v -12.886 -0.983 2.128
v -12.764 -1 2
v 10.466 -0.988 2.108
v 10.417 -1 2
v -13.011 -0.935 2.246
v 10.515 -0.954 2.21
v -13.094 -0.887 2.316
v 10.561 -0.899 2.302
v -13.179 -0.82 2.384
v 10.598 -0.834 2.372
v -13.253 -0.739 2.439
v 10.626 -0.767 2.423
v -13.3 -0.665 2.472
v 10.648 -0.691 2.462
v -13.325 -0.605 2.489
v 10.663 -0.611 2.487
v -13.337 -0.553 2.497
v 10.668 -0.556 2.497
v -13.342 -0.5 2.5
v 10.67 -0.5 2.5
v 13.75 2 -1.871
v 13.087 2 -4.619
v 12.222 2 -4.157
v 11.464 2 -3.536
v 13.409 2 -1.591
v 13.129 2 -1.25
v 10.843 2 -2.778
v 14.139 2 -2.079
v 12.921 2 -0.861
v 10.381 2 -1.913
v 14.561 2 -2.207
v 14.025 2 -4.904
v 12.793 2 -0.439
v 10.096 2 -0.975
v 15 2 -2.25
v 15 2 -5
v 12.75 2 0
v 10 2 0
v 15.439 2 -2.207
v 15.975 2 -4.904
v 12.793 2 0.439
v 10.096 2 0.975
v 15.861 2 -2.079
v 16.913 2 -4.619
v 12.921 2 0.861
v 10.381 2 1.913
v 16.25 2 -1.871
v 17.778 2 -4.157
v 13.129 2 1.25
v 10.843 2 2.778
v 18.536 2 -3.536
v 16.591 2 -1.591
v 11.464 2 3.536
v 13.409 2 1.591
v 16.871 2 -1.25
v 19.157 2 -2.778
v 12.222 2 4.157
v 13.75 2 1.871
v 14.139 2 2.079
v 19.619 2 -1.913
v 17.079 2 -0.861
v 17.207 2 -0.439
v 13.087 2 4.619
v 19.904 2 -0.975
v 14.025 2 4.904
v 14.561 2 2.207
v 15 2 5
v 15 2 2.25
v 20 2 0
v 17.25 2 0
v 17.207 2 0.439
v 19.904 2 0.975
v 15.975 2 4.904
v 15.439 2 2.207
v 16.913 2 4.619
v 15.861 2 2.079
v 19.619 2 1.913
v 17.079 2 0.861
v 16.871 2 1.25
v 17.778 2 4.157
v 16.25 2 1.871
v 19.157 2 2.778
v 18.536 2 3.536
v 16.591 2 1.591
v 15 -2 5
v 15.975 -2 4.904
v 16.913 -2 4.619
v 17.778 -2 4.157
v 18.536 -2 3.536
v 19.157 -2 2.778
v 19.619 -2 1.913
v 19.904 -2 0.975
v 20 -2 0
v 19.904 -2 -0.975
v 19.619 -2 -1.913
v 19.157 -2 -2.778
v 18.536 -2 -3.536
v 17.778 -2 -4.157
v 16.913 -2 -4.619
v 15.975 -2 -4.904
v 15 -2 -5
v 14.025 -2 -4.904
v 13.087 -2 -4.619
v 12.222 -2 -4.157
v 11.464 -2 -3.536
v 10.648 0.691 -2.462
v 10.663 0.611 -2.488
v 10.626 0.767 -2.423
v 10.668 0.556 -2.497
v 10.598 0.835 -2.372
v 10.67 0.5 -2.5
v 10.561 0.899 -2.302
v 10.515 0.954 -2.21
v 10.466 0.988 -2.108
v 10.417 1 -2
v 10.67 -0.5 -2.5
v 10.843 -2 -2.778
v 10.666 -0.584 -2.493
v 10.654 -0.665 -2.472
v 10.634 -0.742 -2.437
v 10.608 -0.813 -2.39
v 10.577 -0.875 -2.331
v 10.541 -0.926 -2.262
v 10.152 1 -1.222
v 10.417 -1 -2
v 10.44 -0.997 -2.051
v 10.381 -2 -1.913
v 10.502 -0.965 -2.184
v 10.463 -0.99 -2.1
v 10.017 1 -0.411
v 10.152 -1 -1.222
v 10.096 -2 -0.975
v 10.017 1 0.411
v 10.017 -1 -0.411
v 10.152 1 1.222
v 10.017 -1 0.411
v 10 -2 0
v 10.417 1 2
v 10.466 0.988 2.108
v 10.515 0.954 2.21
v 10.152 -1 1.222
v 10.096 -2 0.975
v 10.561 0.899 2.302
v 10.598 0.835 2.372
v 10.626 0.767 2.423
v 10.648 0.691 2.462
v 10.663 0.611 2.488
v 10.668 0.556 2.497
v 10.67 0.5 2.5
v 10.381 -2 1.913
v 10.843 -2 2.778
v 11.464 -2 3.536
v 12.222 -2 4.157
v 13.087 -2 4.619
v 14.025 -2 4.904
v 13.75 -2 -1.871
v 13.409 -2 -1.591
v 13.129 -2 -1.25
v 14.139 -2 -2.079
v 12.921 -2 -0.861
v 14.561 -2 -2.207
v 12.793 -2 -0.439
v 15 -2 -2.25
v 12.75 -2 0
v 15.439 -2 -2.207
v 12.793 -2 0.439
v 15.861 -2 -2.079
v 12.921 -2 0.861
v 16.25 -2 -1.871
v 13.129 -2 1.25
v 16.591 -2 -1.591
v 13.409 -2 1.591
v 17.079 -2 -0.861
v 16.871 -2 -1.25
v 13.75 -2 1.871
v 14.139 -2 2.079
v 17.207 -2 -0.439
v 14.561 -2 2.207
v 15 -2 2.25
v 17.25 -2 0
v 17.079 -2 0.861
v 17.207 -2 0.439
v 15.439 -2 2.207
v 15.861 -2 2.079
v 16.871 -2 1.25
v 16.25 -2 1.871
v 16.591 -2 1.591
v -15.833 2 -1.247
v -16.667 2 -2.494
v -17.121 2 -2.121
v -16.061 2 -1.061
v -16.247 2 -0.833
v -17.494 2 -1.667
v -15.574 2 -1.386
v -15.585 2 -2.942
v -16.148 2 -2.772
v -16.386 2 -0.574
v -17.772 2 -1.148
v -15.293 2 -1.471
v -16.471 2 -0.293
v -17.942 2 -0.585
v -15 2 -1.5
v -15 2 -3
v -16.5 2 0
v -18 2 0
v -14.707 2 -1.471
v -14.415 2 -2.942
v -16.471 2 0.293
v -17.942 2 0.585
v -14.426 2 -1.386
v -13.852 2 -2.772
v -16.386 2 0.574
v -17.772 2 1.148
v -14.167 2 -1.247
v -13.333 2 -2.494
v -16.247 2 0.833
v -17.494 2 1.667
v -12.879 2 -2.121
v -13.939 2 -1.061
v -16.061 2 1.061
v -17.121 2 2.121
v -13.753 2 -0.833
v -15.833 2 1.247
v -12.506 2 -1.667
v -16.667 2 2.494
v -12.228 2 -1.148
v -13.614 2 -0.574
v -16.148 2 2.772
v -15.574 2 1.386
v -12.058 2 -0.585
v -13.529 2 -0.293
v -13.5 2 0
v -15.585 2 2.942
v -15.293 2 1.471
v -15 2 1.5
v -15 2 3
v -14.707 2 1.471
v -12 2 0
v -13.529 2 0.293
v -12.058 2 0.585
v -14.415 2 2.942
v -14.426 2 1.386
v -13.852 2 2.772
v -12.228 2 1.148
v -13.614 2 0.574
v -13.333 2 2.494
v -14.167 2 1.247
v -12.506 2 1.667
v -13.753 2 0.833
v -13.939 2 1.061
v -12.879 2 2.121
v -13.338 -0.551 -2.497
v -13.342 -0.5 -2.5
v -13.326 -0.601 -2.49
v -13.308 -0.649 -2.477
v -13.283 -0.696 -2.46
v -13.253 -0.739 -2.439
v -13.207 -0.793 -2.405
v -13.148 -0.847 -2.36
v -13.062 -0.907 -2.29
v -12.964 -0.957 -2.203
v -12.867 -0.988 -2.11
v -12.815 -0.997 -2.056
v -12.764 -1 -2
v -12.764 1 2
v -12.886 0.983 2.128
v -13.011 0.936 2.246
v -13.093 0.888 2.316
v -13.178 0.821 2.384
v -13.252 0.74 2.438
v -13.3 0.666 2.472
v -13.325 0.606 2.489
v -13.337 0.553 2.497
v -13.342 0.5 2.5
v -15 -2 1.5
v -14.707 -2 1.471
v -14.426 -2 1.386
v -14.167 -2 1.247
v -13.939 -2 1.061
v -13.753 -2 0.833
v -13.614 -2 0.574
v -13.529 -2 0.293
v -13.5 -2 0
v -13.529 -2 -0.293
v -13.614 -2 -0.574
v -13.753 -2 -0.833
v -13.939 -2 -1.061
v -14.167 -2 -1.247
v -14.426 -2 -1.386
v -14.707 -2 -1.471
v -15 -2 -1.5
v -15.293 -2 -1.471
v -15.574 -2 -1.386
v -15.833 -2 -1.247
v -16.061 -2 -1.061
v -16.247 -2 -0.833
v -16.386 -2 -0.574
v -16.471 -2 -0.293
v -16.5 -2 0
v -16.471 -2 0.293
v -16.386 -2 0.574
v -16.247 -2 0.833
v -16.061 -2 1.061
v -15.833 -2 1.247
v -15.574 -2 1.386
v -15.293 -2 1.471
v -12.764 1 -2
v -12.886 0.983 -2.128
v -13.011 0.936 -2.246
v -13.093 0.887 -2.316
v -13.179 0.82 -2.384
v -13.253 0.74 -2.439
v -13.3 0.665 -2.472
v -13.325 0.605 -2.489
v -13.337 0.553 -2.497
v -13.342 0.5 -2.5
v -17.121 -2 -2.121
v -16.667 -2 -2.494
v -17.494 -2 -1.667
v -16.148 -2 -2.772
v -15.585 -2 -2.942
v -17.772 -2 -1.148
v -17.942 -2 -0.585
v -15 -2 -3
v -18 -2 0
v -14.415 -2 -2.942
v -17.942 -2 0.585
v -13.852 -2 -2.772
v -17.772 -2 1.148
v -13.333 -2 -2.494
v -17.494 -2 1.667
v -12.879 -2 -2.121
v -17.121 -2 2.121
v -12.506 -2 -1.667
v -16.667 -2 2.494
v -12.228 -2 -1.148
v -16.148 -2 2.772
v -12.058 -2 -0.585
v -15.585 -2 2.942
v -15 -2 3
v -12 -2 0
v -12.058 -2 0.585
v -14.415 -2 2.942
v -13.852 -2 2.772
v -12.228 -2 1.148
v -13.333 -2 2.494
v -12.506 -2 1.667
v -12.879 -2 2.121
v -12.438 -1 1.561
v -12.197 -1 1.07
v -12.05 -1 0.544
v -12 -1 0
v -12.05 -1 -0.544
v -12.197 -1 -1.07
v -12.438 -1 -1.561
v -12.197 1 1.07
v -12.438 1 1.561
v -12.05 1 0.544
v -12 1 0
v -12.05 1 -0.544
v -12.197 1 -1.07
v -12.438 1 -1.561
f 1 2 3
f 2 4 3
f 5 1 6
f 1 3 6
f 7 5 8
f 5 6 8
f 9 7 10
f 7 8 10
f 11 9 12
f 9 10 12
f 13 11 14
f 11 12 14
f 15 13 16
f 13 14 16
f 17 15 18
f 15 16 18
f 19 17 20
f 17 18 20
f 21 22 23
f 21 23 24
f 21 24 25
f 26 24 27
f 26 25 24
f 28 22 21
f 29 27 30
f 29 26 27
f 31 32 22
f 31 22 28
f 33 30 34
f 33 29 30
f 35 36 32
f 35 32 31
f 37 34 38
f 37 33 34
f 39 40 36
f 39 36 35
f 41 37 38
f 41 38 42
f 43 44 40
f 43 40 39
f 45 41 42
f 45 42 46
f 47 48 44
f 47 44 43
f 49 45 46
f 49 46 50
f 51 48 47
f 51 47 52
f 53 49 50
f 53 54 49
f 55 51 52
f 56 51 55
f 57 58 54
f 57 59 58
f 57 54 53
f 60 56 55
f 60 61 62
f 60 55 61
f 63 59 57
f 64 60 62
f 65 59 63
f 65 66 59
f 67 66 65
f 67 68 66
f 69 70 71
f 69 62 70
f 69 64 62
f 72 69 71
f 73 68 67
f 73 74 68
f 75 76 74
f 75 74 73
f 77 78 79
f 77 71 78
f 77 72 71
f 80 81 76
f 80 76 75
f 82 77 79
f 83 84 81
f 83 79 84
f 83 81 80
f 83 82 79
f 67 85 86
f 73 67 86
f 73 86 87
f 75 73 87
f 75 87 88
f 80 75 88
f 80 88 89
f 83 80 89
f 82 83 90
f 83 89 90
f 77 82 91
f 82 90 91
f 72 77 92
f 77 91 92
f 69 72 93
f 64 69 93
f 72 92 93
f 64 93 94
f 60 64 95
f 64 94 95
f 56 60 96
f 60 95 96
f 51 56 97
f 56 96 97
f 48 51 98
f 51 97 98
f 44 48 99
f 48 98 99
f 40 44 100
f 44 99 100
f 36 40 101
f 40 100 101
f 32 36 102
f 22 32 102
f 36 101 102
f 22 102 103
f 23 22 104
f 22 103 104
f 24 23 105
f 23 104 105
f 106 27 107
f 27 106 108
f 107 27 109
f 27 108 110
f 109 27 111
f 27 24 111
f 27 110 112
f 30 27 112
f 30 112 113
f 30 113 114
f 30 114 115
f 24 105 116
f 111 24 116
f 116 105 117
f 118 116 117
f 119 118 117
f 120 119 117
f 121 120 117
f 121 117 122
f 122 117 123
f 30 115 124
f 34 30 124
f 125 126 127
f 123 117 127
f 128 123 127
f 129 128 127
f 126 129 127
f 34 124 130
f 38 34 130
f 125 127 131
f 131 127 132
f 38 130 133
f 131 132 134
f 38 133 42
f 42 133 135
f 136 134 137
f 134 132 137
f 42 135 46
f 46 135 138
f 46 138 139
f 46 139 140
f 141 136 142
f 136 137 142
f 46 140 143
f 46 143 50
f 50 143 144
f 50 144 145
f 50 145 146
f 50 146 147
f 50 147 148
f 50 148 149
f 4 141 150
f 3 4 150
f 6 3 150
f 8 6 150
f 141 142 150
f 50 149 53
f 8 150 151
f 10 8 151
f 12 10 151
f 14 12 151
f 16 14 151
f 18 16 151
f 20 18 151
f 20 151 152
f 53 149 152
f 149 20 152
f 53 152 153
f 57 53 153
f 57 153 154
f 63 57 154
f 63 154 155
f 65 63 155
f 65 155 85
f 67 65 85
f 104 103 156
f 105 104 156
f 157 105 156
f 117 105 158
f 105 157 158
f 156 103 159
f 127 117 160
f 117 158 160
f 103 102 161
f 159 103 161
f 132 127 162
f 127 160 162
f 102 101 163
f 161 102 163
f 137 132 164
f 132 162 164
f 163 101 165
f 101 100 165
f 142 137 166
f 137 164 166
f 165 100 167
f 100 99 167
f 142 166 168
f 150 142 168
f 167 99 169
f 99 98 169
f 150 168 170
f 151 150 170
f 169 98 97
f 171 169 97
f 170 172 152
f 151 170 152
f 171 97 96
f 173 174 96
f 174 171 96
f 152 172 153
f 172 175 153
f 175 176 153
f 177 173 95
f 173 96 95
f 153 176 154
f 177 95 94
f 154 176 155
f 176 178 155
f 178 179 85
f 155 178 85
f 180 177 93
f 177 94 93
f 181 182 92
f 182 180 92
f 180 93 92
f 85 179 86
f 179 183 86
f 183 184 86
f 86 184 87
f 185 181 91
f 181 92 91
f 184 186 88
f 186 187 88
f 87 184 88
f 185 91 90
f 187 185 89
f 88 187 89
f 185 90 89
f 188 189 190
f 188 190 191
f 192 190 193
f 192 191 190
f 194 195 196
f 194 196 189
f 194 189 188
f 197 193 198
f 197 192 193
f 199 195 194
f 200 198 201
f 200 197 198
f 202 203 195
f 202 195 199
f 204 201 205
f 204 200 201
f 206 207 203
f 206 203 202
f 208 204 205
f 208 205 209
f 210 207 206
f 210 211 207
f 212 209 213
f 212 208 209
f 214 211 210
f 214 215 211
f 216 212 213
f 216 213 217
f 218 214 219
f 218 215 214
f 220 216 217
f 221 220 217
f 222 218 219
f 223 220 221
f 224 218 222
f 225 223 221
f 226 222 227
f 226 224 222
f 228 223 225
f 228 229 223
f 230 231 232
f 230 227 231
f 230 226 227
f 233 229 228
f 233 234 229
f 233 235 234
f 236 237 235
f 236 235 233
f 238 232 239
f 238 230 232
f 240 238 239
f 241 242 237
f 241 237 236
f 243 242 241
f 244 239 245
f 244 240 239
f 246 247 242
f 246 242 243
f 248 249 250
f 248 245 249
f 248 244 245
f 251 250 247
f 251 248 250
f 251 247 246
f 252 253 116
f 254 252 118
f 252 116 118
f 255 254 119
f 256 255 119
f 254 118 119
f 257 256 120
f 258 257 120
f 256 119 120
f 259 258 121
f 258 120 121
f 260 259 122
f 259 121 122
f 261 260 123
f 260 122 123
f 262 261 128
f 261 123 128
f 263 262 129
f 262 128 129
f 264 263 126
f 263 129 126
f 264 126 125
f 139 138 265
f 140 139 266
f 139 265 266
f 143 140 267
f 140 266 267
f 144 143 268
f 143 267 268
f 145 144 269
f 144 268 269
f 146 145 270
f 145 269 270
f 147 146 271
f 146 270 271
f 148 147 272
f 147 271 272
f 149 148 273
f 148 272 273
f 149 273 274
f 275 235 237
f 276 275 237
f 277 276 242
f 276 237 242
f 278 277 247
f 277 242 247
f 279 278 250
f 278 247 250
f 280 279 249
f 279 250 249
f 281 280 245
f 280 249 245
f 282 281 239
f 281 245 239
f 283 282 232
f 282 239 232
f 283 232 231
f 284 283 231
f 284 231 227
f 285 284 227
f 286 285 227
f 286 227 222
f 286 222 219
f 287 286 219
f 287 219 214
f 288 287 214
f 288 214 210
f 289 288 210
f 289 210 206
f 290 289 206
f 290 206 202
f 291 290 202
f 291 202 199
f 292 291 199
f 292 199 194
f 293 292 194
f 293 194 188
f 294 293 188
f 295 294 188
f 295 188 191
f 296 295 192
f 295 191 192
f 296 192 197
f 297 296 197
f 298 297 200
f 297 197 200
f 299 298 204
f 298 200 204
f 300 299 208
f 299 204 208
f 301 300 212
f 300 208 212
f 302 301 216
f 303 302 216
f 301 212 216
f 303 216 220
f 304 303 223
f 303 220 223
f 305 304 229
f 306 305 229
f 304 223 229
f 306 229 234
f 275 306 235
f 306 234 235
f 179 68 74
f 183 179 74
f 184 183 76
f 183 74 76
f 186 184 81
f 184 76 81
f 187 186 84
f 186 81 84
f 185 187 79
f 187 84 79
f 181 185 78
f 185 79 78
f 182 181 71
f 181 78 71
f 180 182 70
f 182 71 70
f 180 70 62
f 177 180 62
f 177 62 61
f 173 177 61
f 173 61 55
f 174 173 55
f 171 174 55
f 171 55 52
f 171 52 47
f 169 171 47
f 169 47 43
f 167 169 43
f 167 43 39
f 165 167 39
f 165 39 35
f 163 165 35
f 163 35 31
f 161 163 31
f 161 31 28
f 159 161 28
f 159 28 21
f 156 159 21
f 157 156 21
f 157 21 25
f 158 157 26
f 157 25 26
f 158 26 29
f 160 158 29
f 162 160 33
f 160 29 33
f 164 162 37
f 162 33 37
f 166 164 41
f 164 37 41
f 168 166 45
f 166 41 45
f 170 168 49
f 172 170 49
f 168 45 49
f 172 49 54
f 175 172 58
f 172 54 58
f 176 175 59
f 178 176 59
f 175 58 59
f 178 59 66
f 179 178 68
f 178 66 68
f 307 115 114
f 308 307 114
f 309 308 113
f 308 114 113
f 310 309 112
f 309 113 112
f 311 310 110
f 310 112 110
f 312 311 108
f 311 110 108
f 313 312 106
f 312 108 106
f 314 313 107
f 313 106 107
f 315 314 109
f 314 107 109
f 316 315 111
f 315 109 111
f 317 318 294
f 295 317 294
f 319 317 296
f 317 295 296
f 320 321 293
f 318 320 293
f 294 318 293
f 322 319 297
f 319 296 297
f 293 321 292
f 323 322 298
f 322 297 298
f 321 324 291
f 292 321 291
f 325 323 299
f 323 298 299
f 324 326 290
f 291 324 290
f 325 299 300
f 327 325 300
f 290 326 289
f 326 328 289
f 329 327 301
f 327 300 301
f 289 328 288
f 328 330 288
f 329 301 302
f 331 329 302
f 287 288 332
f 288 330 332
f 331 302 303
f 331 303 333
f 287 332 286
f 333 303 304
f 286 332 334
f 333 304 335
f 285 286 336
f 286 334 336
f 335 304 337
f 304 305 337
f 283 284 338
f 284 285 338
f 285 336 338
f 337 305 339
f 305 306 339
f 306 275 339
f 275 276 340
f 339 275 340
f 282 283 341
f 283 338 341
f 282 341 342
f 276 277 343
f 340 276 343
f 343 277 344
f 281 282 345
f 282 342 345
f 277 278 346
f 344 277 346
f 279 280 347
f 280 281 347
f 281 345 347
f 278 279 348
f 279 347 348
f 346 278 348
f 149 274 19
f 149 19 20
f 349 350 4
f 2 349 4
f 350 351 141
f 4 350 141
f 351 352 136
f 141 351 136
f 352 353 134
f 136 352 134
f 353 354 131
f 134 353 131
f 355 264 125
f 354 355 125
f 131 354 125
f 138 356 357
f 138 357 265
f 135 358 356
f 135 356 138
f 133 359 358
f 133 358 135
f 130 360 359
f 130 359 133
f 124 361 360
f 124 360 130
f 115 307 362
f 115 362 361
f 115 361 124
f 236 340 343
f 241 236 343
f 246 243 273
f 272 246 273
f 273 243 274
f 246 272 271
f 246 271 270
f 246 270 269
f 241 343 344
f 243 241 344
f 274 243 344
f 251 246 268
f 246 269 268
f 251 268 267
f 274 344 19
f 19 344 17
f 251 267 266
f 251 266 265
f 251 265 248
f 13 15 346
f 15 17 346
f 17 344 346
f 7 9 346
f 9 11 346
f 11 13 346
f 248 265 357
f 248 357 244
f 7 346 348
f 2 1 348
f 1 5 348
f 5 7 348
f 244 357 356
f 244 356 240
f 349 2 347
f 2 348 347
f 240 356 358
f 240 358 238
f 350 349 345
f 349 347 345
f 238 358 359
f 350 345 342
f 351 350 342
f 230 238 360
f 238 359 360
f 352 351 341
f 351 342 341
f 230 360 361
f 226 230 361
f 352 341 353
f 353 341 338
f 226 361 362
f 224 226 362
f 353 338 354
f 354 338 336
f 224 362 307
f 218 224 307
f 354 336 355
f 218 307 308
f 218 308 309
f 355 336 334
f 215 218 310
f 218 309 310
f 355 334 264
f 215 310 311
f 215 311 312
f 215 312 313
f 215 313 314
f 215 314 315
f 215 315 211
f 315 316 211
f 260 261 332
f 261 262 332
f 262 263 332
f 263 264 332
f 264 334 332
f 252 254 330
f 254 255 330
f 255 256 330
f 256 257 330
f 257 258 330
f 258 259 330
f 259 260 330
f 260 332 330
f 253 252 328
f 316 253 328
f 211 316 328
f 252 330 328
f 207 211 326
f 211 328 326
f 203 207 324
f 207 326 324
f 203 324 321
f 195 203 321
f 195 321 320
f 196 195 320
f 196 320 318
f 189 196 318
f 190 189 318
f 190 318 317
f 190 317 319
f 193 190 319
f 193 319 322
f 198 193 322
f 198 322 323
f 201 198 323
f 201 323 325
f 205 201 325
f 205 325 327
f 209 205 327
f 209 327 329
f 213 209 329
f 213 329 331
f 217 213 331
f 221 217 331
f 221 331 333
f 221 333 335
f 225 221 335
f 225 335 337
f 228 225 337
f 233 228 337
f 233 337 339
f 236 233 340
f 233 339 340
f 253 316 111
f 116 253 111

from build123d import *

# Parameters (mm, degrees)
SKETCH1_W                = 30
SKETCH1_H                = 5
BOSS_EXTRUDE2_DEPTH      = 1
BOSS_EXTRUDE3_DEPTH      = 1
BOSS_EXTRUDE3_DEPTH_BACK = 3
SKETCH2_R                = 3
SKETCH2_R_2              = 5
SKETCH3_R                = 1.5
SKETCH3_R_2              = 2.25
CUT_EXTRUDE1_DEPTH       = 41
FILLET1_R                = 0.5
FILLET2_R                = 0.5


with BuildPart() as part:
    # Sketch1 → Boss-Extrude2 (new, symmetric)
    with BuildSketch(Plane(origin=(0, 0, 0), x_dir=(1, 0, 0), z_dir=(0, 1, 0))):
        Rectangle(SKETCH1_W, SKETCH1_H)
    extrude(amount=BOSS_EXTRUDE2_DEPTH, both=True)

    # Sketch2 → Boss-Extrude3 (add, two sides: drawn at the far end of the back side and taken through both)
    with BuildSketch(Plane(origin=(0, 1, 0), x_dir=(1, 0, 0), z_dir=(0, 1, 0)).offset(-BOSS_EXTRUDE3_DEPTH_BACK)):
        with Locations(Location((-15, 0, 0), (0, 0, 270))):
            Circle(SKETCH2_R)
        with Locations(Location((15, 0, 0), (0, 0, 270))):
            Circle(SKETCH2_R_2)
    extrude(amount=BOSS_EXTRUDE3_DEPTH + BOSS_EXTRUDE3_DEPTH_BACK)

    # Sketch3 → Cut-Extrude1 (cut)
    with BuildSketch(Plane(origin=(0, 2, 0), x_dir=(1, 0, 0), z_dir=(0, 1, 0))):
        with Locations(Location((-15, 0, 0), (0, 0, 270))):
            Circle(SKETCH3_R)
        with Locations(Location((15, 0, 0), (0, 0, 270))):
            Circle(SKETCH3_R_2)
    extrude(amount=-CUT_EXTRUDE1_DEPTH, mode=Mode.SUBTRACT)

    # Fillet1
    # the kernel refuses this fillet: 0.5 mm, written as the material it takes off along each edge
    with BuildSketch(Plane(origin=(-14.591687605, 1, 2.5), x_dir=(0, -1, 0), z_dir=(1, 0, 0))) as fillet1_piece_1_section:
        with BuildLine():
            CenterArc((FILLET1_R, FILLET1_R), FILLET1_R, 180, 90)
            Line((0, FILLET1_R), (0, 0))
            Line((0, 0), (FILLET1_R, 0))
        make_face()
    fillet1_piece_1 = extrude(amount=26.511560586, mode=Mode.PRIVATE)
    fillet1_piece_1 = fillet1_piece_1 - Plane(origin=(-15, 0.886280148, 0), x_dir=(0, 0, 1), z_dir=(0, 1, 0)) * Cylinder(3, 56, mode=Mode.PRIVATE)
    fillet1_piece_1 = fillet1_piece_1 - Plane(origin=(15, 0.886280148, 0), x_dir=(0, 0, 1), z_dir=(0, 1, 0)) * Cylinder(5, 56, mode=Mode.PRIVATE)
    add(fillet1_piece_1, mode=Mode.SUBTRACT)
    with BuildSketch(Plane(origin=(11.919872981, 1, -2.5), x_dir=(0, 0, 1), z_dir=(-1, 0, 0))) as fillet1_piece_2_section:
        with BuildLine():
            CenterArc((FILLET1_R, -FILLET1_R), FILLET1_R, 90, 90)
            Line((0, -FILLET1_R), (0, 0))
            Line((0, 0), (FILLET1_R, 0))
        make_face()
    fillet1_piece_2 = extrude(amount=26.511560586, mode=Mode.PRIVATE)
    fillet1_piece_2 = fillet1_piece_2 - Plane(origin=(-15, 0.88627951, 0), x_dir=(0, 0, 1), z_dir=(0, 1, 0)) * Cylinder(3, 56, mode=Mode.PRIVATE)
    fillet1_piece_2 = fillet1_piece_2 - Plane(origin=(15, 0.88627951, 0), x_dir=(0, 0, 1), z_dir=(0, -1, 0)) * Cylinder(5, 56, mode=Mode.PRIVATE)
    add(fillet1_piece_2, mode=Mode.SUBTRACT)

    # Fillet2
    fillet2_edges = [part.edges().sort_by_distance(p)[0] for p in [
        (-1.335907312, -1, 2.5),
        (-1.335907312, -1, -2.5),
    ]]
    fillet(fillet2_edges, radius=FILLET2_R)


solid = part.part
